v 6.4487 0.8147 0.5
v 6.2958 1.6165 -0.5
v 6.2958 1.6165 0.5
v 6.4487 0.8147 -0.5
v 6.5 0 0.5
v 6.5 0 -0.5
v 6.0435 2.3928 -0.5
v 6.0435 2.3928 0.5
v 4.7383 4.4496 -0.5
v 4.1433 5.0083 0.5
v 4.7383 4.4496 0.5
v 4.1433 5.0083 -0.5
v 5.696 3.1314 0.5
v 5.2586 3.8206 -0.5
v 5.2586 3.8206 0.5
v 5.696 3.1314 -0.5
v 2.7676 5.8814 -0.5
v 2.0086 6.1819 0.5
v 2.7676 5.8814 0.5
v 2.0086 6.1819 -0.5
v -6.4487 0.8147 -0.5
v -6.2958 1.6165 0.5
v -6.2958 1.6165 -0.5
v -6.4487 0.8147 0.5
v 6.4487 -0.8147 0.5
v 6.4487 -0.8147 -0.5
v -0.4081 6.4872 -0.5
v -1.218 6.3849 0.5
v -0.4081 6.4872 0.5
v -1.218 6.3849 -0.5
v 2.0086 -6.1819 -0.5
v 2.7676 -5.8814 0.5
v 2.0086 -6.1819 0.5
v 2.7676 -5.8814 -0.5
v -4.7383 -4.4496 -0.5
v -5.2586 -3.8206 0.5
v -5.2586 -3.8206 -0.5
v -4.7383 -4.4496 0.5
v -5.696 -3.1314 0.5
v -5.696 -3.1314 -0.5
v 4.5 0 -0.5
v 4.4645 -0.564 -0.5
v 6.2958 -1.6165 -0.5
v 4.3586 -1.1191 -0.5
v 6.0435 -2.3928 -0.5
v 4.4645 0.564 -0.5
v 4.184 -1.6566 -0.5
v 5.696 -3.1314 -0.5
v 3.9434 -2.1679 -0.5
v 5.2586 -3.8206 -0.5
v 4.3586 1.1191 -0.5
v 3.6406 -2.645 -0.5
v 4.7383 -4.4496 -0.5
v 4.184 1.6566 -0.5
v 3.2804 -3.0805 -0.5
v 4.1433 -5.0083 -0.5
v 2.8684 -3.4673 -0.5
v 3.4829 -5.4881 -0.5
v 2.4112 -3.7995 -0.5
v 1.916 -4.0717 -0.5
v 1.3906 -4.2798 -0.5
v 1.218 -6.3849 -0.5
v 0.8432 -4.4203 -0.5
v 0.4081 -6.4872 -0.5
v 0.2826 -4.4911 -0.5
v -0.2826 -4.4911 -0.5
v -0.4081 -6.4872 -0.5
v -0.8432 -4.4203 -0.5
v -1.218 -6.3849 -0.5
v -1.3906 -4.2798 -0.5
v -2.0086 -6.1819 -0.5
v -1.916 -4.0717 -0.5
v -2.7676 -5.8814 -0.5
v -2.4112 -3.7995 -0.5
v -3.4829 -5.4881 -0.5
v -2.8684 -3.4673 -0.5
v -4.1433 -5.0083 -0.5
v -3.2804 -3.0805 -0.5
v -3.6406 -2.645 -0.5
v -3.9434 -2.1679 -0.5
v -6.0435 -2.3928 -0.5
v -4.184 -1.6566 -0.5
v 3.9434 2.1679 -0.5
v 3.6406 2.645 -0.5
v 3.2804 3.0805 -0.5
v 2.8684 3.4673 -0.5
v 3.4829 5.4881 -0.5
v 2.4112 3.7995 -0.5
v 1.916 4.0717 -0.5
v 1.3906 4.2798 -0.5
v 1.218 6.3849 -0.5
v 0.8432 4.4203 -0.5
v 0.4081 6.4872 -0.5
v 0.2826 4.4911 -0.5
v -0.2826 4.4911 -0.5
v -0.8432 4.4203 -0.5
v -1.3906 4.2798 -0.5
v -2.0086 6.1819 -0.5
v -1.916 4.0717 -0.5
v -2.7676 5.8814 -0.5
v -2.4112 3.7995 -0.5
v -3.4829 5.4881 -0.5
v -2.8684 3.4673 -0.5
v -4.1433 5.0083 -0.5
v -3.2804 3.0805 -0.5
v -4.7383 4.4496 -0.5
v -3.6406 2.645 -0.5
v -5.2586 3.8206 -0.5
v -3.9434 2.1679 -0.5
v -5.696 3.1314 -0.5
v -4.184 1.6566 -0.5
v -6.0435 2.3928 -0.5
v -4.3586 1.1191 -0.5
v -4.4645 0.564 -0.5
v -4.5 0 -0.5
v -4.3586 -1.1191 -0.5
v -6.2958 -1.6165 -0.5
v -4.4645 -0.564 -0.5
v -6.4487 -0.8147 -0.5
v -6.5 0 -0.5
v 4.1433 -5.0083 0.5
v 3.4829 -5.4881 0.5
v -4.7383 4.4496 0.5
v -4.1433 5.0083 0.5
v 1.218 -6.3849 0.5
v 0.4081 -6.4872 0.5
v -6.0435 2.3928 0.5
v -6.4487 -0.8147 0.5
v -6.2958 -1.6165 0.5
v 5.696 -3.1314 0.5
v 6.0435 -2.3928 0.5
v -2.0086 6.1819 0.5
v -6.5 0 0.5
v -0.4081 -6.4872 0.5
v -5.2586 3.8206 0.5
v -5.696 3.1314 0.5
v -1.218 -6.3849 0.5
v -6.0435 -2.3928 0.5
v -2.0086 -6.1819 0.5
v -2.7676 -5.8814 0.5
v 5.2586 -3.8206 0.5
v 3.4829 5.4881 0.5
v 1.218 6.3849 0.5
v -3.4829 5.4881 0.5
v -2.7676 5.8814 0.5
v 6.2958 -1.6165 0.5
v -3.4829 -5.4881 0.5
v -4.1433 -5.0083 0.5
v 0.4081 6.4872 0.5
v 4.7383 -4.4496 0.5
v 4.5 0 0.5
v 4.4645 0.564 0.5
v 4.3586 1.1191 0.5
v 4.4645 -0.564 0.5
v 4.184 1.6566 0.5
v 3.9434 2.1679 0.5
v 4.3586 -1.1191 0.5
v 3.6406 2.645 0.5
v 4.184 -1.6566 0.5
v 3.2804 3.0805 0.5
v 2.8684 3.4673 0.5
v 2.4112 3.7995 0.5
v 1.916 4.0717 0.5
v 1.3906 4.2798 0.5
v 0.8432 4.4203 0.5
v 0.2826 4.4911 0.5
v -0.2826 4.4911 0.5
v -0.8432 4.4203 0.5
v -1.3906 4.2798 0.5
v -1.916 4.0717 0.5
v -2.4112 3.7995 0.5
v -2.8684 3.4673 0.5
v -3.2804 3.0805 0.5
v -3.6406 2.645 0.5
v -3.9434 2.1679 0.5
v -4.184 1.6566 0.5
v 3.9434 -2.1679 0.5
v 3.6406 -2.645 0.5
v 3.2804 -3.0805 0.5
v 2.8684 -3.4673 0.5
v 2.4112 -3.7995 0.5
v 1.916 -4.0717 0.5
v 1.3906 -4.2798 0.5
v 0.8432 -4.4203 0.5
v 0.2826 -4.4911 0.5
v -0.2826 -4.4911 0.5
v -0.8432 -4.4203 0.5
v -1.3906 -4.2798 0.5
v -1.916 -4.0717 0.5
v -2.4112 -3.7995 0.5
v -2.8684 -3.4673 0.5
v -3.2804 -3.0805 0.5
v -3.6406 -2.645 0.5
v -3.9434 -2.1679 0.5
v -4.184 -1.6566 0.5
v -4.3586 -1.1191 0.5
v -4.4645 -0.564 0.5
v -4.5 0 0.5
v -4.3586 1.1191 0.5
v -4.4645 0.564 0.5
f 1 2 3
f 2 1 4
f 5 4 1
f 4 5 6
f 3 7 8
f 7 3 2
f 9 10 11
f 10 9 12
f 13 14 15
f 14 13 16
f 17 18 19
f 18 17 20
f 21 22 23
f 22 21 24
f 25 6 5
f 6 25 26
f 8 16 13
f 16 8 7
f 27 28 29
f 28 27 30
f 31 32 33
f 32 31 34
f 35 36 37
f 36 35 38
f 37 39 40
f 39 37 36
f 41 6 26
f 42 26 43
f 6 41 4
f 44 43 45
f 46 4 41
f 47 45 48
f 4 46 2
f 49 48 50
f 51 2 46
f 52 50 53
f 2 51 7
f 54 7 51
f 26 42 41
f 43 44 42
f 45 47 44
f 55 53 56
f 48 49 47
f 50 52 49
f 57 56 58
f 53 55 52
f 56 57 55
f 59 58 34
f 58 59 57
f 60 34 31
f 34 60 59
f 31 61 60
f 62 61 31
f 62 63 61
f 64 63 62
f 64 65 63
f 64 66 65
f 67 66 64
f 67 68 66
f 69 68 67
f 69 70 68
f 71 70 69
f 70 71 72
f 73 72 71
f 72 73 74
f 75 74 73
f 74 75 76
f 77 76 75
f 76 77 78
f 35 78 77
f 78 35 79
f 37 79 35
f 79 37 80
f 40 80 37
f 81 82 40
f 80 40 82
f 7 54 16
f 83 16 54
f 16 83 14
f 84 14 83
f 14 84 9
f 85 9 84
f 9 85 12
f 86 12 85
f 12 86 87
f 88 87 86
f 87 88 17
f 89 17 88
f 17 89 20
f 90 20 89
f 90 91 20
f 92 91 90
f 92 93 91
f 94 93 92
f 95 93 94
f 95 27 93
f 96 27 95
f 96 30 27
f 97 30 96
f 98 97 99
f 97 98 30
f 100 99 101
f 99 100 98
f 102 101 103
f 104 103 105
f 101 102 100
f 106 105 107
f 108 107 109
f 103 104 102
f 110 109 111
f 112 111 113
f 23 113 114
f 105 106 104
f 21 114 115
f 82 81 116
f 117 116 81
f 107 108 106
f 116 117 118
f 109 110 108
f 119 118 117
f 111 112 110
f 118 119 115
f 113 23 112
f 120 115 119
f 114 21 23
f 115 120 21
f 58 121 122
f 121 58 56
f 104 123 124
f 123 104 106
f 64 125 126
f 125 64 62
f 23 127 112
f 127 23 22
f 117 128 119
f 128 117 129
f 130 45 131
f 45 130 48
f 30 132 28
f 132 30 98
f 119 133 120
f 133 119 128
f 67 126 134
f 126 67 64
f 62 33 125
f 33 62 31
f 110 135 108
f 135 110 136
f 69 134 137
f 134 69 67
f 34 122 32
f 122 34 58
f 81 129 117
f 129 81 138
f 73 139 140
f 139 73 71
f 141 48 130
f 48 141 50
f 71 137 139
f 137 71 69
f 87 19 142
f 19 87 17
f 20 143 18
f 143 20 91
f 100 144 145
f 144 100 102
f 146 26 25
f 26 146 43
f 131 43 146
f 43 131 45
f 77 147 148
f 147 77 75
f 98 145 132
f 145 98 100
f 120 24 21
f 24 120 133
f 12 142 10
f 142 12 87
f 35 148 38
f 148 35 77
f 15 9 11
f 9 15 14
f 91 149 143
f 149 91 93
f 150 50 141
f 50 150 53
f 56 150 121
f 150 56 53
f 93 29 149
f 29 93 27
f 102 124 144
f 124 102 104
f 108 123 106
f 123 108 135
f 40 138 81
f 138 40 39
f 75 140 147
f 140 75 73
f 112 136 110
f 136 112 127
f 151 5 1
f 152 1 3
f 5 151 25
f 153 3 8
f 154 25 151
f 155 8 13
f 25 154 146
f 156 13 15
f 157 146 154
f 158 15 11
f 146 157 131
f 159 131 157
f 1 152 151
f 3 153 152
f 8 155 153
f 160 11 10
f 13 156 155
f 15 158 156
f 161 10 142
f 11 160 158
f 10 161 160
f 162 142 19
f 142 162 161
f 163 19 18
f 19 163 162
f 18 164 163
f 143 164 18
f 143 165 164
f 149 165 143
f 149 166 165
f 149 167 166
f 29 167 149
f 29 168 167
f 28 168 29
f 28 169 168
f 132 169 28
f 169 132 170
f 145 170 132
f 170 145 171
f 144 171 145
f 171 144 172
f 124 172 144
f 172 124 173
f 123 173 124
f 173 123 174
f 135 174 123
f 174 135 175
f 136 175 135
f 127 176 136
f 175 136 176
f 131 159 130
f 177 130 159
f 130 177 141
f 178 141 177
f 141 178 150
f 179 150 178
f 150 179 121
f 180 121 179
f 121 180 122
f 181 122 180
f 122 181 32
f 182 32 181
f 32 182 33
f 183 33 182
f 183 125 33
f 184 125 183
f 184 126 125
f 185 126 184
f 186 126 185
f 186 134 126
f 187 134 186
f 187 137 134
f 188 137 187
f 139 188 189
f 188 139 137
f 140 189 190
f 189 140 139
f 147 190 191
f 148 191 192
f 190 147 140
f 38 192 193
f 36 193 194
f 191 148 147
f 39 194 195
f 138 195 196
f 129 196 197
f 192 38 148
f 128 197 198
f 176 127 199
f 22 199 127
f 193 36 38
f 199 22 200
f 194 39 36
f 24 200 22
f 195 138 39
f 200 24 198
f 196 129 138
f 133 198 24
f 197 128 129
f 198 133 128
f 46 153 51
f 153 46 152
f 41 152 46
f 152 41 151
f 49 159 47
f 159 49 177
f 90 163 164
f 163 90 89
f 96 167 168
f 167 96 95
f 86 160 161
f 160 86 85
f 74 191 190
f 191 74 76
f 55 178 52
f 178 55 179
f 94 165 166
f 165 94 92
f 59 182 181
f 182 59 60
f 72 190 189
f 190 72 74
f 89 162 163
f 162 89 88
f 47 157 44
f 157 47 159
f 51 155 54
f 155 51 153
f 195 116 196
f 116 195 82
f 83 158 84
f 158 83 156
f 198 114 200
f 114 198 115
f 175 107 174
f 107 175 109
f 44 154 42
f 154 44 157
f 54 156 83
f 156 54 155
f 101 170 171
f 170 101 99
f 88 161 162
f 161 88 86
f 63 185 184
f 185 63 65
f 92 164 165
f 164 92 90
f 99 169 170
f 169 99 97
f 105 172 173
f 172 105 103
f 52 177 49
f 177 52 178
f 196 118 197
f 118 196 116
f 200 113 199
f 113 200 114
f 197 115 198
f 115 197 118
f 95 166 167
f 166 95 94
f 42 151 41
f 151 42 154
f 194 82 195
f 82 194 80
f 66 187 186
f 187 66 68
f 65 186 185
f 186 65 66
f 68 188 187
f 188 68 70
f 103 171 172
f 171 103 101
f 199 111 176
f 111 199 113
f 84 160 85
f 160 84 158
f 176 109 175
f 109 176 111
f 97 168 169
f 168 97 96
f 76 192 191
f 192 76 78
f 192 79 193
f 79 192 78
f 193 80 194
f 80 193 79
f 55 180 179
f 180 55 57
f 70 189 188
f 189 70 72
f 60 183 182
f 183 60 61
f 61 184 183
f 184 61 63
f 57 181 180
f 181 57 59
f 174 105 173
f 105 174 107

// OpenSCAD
$fn = 50;


difference() {
	union() {
		translate(v = [0, 0, -0.5000000000]) {
			cylinder(h = 1, r = 6.5000000000);
		}
	}
	union() {
		translate(v = [0, 0, -100.0000000000]) {
			cylinder(h = 200, r = 4.5000000000);
		}
	}
}
